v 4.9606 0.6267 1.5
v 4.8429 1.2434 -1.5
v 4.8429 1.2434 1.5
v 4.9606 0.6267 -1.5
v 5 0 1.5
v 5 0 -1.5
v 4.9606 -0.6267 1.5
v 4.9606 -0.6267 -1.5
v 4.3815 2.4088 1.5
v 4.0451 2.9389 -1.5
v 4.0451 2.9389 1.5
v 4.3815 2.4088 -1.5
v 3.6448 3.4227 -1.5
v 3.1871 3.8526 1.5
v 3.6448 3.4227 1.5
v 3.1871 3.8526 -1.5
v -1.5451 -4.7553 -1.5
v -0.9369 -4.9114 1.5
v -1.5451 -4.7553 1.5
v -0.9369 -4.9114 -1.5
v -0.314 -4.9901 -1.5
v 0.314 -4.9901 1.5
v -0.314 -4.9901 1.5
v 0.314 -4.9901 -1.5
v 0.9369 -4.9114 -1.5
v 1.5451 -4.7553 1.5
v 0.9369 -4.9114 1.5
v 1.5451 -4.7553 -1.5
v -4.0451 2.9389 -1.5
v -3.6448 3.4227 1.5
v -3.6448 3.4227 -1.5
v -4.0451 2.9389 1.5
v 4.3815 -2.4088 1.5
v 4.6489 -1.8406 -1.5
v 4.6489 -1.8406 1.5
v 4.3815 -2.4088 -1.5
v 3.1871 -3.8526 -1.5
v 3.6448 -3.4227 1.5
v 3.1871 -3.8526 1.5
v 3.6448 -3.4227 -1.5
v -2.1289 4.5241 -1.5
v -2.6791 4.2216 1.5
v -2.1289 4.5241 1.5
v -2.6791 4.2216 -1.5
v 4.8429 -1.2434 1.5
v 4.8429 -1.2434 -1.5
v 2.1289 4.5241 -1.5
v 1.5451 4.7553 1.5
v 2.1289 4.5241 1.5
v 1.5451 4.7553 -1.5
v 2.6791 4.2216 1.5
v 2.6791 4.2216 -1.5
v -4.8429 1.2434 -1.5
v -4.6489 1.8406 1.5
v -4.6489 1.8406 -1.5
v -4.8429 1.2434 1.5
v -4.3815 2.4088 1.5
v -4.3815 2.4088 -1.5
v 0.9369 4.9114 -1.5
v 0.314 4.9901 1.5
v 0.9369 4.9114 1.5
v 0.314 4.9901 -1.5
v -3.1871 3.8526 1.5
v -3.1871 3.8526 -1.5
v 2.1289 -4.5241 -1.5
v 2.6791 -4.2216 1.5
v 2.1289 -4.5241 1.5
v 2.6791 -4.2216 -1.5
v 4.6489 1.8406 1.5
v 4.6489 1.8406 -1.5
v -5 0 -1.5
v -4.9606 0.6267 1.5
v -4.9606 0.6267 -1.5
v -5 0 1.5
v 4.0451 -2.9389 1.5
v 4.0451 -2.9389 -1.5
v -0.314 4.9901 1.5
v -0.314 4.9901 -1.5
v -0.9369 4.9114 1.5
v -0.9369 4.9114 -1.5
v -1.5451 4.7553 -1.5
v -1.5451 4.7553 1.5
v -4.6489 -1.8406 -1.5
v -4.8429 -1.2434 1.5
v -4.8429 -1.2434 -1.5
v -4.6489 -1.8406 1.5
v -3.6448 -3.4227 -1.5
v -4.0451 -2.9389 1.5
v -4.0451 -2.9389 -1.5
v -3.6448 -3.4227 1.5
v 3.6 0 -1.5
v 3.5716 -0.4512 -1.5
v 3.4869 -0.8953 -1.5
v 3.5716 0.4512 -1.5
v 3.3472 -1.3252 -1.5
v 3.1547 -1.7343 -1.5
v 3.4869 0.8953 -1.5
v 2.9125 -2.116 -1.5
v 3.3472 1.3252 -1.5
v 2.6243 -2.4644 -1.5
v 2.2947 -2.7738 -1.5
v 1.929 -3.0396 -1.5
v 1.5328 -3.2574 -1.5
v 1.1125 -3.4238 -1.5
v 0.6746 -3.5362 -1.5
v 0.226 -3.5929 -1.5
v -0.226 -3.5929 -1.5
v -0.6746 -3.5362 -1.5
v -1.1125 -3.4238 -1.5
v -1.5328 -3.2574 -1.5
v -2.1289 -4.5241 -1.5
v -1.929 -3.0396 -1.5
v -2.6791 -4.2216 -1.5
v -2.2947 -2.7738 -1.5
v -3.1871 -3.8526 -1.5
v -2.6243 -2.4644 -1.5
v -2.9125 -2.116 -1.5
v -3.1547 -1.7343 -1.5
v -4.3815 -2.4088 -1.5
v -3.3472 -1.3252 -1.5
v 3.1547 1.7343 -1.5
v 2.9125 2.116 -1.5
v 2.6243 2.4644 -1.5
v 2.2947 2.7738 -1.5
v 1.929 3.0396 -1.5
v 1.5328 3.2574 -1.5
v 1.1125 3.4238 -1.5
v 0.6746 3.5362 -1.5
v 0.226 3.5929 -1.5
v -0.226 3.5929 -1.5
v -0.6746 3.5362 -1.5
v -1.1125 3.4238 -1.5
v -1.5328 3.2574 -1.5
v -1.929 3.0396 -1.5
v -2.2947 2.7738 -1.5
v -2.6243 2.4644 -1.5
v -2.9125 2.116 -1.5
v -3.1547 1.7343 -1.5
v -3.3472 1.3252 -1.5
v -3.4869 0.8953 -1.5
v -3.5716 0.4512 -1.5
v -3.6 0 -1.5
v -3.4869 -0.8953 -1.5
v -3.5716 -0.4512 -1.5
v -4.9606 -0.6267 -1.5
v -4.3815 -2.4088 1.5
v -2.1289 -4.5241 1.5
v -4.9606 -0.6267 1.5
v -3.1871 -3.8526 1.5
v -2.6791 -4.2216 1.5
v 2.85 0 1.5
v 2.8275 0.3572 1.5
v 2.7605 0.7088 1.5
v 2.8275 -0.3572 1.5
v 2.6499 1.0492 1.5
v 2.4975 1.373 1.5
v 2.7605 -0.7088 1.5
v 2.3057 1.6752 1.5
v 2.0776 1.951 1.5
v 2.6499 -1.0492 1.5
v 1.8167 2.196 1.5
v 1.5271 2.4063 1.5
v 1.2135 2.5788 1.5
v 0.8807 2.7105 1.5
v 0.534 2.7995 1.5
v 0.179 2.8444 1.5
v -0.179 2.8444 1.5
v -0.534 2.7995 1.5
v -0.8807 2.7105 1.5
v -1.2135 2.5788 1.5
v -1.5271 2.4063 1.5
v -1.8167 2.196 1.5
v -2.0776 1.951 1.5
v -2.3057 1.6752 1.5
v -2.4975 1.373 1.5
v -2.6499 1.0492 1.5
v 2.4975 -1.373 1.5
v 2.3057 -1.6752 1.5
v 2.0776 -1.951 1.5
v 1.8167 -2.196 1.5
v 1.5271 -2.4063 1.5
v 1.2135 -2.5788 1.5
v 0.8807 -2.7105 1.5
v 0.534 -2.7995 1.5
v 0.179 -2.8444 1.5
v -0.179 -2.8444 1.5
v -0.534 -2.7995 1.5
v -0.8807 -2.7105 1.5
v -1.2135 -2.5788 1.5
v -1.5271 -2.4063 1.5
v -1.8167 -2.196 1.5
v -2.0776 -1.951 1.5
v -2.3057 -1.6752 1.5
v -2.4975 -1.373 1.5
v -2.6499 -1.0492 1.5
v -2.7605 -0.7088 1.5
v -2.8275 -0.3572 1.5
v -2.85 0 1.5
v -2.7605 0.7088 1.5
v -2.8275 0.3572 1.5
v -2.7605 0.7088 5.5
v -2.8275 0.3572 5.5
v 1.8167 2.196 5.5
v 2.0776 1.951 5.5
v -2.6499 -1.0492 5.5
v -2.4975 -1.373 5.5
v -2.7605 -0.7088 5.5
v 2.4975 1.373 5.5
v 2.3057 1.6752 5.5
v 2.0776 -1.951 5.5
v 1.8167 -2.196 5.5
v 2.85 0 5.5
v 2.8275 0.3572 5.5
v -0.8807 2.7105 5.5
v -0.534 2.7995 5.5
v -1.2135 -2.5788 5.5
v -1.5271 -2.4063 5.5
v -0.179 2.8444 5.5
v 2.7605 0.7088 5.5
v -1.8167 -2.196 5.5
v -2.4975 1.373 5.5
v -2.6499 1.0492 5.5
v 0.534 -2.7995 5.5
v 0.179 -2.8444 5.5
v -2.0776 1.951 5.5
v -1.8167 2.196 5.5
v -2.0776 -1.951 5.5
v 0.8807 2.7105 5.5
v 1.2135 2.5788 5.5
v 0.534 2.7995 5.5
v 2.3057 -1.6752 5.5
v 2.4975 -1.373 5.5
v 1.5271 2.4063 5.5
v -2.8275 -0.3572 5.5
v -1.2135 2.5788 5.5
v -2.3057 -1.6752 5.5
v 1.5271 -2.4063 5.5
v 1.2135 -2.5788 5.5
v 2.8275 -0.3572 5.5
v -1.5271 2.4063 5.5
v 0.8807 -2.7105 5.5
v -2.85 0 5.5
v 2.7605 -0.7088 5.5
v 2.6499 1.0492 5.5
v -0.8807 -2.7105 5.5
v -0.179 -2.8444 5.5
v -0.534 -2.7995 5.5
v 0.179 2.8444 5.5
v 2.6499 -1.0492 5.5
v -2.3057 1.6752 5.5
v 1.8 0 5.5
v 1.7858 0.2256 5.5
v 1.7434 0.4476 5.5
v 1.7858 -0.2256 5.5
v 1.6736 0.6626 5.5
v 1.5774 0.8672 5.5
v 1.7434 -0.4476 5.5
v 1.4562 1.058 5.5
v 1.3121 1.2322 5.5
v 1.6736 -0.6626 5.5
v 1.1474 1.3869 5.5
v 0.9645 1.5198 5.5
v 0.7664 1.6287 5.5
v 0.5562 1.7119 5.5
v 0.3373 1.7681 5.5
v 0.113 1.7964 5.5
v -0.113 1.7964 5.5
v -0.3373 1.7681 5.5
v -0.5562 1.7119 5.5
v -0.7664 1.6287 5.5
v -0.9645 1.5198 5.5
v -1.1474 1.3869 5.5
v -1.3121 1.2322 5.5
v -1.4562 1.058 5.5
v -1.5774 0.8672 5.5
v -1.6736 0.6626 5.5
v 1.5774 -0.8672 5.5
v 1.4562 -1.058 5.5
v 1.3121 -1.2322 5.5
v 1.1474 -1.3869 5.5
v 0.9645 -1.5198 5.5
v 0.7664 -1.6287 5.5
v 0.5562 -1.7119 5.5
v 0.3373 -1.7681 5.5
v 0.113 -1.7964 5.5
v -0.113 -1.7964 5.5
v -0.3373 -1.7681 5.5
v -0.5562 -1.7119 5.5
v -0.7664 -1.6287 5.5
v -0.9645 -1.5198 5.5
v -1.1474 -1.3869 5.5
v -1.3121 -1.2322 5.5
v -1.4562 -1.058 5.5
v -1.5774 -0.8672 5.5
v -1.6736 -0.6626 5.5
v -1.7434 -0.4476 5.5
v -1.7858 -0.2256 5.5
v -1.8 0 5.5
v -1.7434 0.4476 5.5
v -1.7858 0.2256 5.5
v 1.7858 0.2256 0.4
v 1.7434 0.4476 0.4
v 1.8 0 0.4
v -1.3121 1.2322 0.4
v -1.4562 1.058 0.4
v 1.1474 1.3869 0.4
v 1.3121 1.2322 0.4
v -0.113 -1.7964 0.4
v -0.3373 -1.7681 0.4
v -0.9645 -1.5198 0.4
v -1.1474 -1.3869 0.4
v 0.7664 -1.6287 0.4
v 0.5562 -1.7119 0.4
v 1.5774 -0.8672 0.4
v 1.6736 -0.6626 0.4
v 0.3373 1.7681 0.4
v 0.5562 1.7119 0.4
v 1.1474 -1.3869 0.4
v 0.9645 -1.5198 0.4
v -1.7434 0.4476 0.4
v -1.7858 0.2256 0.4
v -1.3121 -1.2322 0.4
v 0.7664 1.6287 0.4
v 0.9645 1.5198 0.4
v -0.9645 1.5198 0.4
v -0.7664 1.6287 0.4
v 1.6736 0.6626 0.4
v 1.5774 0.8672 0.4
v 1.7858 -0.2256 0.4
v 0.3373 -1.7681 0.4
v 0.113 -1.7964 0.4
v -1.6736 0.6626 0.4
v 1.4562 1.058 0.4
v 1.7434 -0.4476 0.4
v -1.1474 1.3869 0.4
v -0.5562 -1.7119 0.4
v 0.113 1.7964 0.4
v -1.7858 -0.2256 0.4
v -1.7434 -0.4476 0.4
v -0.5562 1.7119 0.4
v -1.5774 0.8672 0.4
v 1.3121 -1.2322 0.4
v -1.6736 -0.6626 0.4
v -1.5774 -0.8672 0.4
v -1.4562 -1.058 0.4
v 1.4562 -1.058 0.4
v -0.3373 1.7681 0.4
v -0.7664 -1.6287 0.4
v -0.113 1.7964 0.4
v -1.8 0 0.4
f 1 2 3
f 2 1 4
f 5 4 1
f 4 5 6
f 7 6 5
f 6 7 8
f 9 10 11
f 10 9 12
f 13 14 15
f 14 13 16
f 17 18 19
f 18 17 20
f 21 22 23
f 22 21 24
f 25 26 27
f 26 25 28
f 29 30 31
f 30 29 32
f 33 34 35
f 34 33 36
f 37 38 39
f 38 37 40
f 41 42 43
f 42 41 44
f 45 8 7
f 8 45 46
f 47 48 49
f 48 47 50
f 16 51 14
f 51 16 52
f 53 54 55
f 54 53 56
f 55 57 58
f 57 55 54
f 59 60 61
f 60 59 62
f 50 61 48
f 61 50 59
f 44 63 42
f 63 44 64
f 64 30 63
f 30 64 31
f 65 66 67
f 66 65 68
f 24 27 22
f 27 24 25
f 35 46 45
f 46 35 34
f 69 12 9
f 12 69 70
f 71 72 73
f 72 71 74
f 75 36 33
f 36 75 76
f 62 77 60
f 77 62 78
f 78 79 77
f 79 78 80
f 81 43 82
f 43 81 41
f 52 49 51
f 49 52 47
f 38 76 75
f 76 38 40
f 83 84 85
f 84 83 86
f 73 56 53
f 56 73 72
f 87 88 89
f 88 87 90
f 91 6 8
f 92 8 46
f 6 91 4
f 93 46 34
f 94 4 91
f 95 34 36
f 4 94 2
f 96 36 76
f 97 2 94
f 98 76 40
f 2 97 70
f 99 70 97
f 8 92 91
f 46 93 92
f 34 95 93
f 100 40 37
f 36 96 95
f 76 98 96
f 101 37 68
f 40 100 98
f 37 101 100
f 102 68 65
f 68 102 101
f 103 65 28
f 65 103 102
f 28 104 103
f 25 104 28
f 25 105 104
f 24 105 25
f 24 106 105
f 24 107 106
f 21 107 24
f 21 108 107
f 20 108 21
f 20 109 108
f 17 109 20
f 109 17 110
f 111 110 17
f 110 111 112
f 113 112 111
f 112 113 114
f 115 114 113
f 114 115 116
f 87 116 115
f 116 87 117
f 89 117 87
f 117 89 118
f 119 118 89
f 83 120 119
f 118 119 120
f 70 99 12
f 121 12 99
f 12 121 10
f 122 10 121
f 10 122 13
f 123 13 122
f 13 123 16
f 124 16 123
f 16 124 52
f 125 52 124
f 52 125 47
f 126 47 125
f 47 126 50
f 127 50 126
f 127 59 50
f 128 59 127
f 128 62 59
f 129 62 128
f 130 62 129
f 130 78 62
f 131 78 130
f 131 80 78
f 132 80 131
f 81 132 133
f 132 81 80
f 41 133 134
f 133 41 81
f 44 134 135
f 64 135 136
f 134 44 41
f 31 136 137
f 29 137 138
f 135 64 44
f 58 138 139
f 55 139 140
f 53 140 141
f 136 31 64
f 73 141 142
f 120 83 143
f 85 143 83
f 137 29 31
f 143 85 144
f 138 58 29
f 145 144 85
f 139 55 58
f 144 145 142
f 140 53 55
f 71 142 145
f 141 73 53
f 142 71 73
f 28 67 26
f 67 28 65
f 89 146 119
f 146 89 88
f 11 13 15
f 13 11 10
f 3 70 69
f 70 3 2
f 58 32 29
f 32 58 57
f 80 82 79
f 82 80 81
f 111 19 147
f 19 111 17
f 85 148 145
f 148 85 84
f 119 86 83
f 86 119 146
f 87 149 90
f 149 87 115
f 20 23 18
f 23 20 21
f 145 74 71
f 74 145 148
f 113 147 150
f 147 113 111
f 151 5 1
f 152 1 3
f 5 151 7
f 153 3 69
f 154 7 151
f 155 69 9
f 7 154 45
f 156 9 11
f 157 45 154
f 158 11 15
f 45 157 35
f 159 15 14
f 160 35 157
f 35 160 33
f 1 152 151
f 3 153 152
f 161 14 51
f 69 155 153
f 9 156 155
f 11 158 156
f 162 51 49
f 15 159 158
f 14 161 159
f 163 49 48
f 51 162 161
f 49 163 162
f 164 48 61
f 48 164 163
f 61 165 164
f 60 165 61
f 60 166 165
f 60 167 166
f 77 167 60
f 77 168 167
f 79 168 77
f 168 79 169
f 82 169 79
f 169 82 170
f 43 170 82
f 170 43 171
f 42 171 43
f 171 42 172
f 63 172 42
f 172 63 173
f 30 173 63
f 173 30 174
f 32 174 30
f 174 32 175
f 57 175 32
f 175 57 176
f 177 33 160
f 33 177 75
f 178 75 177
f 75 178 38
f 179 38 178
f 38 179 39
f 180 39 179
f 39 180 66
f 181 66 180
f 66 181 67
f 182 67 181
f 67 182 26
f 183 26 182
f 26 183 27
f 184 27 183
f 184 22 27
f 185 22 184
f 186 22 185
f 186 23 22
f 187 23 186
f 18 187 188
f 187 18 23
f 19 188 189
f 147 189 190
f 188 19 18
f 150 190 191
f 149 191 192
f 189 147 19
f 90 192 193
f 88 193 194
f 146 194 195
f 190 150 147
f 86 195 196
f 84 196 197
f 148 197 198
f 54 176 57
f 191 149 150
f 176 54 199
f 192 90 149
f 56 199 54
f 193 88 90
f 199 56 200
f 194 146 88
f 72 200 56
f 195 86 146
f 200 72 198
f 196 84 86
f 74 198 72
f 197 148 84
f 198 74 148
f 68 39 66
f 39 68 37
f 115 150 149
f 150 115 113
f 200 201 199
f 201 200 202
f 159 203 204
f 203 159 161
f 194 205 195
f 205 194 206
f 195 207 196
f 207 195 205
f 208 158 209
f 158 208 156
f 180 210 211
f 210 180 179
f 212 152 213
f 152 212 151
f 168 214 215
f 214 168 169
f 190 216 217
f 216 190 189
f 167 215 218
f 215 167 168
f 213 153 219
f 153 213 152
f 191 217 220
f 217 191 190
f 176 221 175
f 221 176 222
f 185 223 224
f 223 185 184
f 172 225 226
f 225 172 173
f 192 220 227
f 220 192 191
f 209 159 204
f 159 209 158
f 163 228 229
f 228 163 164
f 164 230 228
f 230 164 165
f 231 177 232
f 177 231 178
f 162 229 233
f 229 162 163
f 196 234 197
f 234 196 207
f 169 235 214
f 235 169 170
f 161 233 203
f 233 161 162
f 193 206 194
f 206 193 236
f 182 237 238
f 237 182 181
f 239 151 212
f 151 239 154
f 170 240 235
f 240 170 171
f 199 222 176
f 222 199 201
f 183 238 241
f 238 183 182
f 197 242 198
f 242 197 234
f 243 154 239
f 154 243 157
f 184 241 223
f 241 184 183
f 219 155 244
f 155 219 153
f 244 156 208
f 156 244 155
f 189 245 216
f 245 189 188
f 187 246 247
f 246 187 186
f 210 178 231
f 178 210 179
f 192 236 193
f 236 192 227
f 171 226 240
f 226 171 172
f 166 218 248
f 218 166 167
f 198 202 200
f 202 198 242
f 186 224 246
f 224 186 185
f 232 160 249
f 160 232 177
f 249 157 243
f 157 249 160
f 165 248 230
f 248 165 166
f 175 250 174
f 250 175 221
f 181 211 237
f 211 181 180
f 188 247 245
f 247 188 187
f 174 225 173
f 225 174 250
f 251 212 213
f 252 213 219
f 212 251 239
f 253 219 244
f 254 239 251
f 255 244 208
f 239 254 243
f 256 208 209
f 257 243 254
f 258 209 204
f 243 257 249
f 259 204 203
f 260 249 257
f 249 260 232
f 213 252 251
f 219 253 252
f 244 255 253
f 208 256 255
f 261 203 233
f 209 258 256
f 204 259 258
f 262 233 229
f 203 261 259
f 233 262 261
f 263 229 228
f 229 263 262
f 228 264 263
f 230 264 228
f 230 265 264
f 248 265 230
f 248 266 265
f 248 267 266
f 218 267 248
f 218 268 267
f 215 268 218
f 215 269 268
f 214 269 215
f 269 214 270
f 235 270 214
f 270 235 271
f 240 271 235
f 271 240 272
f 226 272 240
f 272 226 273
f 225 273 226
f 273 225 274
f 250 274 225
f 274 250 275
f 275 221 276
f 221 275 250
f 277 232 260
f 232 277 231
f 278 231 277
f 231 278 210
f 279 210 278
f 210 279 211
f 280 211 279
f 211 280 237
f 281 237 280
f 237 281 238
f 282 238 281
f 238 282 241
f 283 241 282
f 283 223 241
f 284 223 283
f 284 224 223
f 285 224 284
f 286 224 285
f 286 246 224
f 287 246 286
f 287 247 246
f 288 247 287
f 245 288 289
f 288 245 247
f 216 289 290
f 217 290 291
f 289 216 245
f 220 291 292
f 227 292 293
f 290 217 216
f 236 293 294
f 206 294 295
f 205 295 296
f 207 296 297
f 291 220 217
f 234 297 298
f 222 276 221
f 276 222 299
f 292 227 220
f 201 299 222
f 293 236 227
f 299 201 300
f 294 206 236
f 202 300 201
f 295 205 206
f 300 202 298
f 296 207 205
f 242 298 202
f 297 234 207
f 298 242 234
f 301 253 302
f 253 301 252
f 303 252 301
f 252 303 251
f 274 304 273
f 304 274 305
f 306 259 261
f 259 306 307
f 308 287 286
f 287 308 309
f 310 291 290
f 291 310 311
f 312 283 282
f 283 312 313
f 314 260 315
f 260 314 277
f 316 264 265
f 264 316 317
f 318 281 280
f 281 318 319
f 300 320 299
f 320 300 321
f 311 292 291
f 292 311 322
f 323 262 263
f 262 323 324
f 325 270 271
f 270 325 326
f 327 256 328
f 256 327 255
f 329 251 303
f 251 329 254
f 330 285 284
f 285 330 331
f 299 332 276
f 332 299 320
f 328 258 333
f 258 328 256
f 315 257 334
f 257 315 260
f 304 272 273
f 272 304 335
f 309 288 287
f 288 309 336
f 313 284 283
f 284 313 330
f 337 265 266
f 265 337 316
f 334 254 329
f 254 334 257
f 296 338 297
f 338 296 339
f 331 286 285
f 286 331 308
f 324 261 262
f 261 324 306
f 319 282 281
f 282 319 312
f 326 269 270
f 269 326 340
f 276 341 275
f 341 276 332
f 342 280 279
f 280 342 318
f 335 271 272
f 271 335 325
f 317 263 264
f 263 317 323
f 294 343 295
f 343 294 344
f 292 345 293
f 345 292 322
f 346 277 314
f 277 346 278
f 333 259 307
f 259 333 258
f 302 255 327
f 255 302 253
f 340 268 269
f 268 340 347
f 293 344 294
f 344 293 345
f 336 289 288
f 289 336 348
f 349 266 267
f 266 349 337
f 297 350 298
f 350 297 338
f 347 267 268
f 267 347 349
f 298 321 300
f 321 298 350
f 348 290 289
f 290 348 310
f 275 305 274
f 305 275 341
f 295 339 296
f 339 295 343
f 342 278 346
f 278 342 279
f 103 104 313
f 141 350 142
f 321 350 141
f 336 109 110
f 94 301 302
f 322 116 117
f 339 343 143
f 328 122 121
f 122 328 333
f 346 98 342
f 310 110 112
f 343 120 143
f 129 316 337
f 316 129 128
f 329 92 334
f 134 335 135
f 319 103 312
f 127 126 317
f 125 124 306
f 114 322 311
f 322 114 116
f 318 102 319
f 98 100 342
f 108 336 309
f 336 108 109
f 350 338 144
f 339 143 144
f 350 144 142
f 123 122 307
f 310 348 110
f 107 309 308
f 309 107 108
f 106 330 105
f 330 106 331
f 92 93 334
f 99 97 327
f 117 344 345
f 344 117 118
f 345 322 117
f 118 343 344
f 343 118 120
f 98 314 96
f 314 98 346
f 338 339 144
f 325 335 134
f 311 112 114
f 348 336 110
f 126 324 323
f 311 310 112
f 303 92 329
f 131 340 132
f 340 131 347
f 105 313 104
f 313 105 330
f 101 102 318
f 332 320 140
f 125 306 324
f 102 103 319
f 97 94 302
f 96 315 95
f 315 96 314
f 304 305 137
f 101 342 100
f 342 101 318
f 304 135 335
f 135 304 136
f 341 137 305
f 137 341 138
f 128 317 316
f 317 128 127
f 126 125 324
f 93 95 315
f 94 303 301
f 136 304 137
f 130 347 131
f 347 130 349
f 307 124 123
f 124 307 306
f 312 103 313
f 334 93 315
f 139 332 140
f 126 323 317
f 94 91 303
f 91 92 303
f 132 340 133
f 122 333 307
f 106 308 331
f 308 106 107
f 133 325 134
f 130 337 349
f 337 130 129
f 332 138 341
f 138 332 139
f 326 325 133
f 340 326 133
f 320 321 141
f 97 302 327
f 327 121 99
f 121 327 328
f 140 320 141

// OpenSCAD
$fn = 50;


difference() {
	union() {
		translate(v = [0, 0, -1.5000000000]) {
			rotate(a = [0, 0, 0]) {
				cylinder(h = 3, r = 5.0000000000);
			}
		}
		translate(v = [0, 0, -1.5000000000]) {
			rotate(a = [0, 0, 0]) {
				cylinder(h = 7, r = 2.8500000000);
			}
		}
	}
	union() {
		translate(v = [0, 0, -125.0000000000]) {
			rotate(a = [0, 0, 0]) {
				cylinder(h = 250, r = 1.8000000000);
			}
		}
		#translate(v = [0, 0, 0.4000000000]) {
			rotate(a = [0, 180, 0]) {
				cylinder(h = 1.9000000000, r1 = 1.8000000000, r2 = 3.6000000000);
			}
		}
		#translate(v = [0, 0, 5.5000000000]) {
			rotate(a = [0, 180, 0]) {
				cylinder(h = 7, r = 1.8000000000);
			}
		}
	}
}
